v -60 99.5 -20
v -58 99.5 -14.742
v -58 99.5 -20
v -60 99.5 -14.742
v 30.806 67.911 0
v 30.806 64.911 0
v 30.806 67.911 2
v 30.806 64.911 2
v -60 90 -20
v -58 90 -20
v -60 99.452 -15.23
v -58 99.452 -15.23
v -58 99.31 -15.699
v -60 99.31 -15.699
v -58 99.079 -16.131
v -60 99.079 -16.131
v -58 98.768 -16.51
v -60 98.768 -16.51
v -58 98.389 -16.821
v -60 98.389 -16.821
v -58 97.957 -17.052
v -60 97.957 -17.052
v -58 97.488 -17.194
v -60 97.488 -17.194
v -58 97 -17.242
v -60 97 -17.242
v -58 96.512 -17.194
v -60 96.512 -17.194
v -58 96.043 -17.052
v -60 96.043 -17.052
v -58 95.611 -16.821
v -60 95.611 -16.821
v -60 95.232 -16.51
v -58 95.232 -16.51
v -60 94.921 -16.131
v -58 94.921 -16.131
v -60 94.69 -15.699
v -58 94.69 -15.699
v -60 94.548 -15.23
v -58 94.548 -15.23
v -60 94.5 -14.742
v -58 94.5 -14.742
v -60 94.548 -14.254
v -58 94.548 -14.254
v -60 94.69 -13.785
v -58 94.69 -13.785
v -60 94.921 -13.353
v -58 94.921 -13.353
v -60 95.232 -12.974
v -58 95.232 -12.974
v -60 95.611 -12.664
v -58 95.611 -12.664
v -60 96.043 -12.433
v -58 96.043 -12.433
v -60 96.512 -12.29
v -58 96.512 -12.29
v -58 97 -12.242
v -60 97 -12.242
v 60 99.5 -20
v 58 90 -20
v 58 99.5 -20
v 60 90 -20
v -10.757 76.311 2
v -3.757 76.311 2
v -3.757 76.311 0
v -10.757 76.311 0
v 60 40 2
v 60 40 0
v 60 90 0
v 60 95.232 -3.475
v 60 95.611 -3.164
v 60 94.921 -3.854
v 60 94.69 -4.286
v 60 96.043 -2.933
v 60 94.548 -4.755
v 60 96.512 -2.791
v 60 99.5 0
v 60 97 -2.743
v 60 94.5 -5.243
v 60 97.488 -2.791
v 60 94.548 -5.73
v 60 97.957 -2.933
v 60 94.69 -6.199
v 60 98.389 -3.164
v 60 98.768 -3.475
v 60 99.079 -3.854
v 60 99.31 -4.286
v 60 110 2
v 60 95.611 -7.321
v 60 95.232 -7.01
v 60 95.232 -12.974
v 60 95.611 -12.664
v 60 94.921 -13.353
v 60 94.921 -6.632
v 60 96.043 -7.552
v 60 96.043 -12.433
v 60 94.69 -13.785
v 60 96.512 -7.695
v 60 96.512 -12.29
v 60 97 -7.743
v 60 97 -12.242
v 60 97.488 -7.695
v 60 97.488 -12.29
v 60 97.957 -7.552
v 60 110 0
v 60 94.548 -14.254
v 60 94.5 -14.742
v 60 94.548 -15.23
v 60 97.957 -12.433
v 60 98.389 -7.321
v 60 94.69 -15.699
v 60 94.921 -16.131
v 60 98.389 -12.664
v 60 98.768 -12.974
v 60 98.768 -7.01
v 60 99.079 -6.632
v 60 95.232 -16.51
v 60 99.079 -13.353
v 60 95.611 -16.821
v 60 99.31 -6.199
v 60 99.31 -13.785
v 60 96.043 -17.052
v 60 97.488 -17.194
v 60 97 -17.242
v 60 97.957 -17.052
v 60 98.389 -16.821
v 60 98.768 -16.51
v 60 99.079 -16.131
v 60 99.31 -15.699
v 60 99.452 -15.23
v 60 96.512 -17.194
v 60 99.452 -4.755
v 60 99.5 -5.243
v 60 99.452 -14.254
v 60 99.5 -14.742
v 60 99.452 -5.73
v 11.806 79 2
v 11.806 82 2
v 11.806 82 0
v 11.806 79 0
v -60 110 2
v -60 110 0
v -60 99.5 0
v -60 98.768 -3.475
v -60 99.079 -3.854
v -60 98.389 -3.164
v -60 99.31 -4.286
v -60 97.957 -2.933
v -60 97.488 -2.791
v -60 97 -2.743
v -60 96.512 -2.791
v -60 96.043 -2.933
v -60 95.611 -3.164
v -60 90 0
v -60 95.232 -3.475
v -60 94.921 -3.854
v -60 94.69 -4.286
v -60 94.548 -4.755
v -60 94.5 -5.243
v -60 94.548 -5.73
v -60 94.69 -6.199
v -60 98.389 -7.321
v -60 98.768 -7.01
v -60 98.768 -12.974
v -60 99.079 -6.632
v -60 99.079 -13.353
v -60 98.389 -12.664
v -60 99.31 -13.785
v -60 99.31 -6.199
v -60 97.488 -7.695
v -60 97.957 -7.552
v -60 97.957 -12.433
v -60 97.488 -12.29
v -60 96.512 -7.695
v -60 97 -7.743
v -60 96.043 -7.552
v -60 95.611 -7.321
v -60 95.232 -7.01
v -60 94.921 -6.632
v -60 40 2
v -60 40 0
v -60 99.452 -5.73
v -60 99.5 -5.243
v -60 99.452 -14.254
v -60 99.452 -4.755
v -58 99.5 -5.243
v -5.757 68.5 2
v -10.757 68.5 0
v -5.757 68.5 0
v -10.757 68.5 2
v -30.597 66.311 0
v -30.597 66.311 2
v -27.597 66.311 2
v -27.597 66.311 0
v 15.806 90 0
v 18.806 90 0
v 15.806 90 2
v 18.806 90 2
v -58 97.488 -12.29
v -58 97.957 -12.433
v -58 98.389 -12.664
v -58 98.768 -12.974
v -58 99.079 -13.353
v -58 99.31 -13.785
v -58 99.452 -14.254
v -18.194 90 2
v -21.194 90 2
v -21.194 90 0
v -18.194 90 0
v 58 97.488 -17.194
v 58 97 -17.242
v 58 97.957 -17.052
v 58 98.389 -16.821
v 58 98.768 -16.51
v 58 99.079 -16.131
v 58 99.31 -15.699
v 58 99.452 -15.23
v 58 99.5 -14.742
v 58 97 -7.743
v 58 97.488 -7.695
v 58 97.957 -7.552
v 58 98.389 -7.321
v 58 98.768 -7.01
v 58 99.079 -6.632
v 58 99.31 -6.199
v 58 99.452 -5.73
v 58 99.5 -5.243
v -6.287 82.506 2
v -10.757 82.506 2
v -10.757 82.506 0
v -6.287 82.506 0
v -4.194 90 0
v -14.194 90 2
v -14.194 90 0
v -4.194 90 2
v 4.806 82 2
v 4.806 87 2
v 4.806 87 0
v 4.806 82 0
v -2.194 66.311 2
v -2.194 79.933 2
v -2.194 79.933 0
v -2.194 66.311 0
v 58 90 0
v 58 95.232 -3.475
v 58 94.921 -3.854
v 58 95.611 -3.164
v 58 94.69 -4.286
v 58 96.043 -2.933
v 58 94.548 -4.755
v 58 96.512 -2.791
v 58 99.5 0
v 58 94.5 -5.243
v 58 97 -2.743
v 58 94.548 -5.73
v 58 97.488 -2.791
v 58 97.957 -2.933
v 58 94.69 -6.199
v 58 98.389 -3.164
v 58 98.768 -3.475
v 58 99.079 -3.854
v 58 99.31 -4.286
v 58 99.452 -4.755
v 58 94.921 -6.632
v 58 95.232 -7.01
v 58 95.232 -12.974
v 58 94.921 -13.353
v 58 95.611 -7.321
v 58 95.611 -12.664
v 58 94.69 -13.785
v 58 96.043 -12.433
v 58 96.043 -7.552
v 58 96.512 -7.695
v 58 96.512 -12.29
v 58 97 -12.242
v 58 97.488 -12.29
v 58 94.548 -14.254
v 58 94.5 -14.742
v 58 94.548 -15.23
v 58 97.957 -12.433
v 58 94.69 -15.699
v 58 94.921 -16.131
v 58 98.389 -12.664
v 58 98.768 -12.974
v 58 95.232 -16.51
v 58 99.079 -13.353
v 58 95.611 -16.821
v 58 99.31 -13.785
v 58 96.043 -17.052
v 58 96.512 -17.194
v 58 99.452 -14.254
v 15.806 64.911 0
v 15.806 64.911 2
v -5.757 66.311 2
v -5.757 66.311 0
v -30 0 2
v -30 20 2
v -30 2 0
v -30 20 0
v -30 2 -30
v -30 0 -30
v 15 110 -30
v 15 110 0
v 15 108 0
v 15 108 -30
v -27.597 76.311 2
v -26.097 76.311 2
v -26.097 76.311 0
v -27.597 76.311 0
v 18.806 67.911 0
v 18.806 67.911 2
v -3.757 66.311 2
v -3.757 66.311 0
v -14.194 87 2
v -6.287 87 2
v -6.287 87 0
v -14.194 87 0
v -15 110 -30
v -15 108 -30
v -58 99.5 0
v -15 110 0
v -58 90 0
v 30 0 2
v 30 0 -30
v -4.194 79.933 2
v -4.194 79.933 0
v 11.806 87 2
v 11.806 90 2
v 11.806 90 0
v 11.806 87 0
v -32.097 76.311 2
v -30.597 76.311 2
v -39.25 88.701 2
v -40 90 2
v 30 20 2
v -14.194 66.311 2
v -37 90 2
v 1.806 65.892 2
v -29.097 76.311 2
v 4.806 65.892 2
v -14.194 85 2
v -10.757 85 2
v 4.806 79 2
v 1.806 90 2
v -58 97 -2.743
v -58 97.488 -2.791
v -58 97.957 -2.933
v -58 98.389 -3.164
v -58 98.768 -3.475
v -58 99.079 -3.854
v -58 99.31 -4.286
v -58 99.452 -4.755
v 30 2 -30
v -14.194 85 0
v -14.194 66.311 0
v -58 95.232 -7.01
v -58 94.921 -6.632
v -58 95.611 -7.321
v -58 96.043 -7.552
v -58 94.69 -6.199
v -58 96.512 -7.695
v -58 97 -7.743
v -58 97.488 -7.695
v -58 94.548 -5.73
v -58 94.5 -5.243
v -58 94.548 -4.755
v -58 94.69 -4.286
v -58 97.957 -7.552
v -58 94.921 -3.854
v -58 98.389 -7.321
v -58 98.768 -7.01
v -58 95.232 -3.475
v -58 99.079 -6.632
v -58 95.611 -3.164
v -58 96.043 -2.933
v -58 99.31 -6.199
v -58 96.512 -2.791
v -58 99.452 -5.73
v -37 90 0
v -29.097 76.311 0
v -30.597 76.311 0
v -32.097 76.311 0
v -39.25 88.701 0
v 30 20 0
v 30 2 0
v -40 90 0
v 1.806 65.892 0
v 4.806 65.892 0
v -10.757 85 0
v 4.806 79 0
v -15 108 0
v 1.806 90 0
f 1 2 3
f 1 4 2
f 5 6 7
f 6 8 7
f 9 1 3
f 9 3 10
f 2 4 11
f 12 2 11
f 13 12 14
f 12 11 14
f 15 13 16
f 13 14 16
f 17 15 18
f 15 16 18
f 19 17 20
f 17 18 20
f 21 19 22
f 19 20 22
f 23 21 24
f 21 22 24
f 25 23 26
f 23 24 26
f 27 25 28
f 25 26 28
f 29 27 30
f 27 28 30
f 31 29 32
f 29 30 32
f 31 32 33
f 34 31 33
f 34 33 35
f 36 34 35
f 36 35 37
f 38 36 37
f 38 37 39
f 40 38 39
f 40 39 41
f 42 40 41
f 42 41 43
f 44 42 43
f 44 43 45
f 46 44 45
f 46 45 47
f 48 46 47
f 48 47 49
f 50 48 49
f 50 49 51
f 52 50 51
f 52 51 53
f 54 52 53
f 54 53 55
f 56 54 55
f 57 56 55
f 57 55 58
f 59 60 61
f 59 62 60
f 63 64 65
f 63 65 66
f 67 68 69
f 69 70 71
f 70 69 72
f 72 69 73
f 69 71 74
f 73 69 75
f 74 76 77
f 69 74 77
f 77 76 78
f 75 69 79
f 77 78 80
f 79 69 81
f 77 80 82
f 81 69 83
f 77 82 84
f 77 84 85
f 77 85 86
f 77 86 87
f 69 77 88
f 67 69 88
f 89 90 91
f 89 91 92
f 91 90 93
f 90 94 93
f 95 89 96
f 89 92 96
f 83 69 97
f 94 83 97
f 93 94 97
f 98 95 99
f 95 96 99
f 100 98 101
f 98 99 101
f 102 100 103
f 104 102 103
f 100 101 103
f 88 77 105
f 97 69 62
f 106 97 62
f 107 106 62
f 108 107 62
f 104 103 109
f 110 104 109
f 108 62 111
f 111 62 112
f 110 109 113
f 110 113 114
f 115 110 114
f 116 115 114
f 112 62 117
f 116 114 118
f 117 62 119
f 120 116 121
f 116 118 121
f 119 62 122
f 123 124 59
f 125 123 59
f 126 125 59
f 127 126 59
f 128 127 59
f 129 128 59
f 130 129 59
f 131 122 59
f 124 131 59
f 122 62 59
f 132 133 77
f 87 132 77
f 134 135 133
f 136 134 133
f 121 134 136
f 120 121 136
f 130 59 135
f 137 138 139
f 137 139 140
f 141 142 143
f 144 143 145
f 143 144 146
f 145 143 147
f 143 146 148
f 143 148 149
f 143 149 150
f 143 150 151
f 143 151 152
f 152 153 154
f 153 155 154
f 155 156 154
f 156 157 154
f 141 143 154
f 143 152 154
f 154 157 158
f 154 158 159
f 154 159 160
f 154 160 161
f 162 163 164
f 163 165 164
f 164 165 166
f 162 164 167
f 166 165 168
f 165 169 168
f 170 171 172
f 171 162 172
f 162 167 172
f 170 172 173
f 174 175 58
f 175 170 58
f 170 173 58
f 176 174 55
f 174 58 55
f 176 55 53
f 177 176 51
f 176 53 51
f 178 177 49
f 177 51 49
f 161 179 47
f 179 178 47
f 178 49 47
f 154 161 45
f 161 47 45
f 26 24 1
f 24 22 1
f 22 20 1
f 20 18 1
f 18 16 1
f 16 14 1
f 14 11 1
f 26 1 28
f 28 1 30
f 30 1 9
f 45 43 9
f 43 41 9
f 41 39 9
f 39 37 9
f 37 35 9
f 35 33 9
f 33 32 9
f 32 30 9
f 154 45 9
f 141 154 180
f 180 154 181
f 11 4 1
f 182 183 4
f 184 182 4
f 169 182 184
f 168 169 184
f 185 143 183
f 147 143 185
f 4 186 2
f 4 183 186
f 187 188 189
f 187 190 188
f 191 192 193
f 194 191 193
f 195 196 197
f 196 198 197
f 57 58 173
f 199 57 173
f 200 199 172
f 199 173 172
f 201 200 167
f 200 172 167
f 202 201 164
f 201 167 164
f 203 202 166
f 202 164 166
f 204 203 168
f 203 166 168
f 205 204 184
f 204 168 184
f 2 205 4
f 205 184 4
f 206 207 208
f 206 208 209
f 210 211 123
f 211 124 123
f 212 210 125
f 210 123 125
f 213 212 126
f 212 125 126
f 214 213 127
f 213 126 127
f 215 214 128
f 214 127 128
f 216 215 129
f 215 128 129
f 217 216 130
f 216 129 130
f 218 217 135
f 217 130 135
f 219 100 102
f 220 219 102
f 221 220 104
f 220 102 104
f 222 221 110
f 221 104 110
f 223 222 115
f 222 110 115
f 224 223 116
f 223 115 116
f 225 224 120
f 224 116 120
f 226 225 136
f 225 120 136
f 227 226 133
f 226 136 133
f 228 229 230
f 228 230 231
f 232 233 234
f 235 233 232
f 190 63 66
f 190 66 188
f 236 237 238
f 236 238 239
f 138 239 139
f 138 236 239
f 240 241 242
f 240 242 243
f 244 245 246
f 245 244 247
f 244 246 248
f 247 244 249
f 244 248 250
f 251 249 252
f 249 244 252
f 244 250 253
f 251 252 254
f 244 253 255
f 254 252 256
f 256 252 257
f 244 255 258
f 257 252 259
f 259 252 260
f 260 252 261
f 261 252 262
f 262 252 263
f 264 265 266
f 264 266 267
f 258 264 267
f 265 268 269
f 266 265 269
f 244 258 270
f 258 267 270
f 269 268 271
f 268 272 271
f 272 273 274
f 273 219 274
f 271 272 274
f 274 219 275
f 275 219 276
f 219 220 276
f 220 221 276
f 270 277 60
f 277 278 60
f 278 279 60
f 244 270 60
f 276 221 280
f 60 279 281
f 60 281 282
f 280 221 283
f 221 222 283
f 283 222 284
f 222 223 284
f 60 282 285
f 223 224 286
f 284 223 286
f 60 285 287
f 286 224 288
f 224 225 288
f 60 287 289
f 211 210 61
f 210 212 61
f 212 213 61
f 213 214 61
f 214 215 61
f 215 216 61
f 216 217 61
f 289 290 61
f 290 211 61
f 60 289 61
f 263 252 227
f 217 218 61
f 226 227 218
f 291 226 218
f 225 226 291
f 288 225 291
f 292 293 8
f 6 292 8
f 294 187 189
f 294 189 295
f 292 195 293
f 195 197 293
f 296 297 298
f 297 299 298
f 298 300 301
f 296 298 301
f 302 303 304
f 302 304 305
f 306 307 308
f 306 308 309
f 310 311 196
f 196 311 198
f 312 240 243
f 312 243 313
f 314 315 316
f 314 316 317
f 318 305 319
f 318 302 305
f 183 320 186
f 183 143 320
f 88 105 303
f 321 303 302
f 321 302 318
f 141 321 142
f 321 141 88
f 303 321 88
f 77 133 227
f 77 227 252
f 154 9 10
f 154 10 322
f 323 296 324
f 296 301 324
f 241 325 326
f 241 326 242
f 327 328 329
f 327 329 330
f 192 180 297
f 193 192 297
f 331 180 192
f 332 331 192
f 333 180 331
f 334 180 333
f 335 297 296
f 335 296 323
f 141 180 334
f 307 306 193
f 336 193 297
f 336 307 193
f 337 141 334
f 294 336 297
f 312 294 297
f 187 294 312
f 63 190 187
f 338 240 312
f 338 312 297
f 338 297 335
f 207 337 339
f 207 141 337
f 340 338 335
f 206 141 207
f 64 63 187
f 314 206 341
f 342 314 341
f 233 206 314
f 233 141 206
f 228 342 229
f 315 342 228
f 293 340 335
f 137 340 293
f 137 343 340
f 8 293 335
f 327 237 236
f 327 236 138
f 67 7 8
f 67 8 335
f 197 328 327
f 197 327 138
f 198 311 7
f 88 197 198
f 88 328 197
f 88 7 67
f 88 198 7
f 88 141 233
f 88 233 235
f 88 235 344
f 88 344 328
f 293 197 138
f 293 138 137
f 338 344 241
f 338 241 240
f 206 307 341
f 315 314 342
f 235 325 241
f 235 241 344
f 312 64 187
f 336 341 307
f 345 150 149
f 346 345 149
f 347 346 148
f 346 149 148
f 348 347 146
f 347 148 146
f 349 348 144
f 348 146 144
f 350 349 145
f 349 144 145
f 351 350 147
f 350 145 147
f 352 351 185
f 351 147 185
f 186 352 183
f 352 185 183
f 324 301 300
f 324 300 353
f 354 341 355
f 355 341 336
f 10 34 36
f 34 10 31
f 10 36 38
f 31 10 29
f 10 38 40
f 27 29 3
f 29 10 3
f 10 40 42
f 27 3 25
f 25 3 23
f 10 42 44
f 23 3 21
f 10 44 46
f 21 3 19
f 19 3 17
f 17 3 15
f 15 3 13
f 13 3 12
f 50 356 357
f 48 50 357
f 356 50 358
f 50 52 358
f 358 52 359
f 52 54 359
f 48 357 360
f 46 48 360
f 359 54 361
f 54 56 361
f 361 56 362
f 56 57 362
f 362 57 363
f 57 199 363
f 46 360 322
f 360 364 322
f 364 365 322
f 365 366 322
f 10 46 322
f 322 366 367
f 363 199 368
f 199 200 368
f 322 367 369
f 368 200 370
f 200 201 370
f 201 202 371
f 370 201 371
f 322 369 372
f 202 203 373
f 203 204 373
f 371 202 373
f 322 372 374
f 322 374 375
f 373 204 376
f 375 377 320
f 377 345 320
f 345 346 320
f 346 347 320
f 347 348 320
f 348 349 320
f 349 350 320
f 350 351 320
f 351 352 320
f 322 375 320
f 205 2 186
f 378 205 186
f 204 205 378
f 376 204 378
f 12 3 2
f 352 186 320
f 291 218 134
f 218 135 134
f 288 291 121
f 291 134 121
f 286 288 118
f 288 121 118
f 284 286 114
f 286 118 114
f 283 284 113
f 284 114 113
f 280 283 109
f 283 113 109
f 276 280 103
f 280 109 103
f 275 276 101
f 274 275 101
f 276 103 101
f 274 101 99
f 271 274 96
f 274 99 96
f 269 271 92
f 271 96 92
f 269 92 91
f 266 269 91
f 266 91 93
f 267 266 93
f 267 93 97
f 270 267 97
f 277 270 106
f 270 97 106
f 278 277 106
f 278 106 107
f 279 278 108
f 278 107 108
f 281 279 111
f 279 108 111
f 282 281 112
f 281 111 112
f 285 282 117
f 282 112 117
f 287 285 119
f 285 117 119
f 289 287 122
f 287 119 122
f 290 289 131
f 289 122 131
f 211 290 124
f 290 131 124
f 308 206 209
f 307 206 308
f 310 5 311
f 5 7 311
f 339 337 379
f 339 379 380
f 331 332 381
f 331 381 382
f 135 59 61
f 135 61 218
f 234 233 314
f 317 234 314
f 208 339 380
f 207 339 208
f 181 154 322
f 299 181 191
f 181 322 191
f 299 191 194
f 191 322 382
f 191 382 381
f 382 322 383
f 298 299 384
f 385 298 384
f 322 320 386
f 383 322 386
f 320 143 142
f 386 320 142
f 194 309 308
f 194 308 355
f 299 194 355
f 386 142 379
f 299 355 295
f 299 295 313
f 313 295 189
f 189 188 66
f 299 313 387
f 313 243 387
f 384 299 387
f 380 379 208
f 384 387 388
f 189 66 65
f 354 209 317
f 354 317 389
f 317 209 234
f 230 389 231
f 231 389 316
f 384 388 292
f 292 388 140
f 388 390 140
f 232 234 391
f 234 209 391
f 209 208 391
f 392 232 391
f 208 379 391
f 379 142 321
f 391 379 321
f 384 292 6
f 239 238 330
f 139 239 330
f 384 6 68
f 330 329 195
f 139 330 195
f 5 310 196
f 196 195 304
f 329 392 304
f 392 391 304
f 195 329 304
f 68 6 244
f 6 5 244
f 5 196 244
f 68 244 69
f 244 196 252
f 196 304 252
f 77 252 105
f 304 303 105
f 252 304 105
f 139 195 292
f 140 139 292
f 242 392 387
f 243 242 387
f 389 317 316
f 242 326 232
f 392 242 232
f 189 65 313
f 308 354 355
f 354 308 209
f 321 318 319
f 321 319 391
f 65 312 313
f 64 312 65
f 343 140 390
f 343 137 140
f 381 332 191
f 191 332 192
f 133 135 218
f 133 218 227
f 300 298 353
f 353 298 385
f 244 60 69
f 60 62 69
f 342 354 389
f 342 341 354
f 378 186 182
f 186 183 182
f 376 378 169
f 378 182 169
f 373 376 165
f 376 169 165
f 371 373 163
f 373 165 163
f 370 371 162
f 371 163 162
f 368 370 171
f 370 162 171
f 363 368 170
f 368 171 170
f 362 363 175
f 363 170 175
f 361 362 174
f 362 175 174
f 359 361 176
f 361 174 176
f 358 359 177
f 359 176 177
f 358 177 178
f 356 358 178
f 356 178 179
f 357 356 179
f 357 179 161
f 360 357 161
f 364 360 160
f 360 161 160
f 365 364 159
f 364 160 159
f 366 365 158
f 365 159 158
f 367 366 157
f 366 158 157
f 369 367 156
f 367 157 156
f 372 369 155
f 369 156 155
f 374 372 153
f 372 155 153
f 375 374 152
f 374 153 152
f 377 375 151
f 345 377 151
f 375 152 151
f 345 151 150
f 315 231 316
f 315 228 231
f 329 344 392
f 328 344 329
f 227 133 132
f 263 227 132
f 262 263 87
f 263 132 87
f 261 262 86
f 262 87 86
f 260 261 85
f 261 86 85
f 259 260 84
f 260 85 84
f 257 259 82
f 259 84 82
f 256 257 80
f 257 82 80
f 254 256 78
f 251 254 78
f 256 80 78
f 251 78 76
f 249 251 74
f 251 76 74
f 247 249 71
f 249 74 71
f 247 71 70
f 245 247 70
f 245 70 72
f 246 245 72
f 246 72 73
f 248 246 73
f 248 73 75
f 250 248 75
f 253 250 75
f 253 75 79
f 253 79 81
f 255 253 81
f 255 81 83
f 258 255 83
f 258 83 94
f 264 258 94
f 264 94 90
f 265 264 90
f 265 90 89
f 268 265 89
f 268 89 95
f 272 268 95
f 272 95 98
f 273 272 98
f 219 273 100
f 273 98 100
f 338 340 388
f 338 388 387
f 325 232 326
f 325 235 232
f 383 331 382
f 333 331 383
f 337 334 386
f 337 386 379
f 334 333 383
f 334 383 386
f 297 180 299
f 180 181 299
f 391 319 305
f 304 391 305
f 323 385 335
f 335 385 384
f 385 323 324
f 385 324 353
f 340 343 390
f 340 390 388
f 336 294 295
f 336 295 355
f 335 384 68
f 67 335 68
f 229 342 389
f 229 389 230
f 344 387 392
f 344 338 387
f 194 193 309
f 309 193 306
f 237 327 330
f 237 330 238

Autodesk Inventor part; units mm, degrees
ref_plane "YZ Plane" through (0, 0, 0) normal (1, 0, 0) x (0, 1, 0)
ref_plane "XZ Plane" through (0, 0, 0) normal (0, 1, 0) x (-1, 0, 0)
ref_plane "XY Plane" through (0, 0, 0) normal (0, 0, 1) x (1, 0, 0)
sketch "Sketch1" plane through (0, 0, 0) normal (0, 0, 1) x (1, 0, 0)
  line L0 (-30, 0) -> (30, 0)
  line L1 (30, 0) -> (30, 20)
  line L2 (-30, 20) -> (-30, 0)
  line L3 (60, 40) -> (60, 110)
  line L4 (60, 110) -> (-60, 110)
  line L5 (-60, 110) -> (-60, 40)
  line L6 (-60, 40) -> (-30, 20)
  line L7 (30, 20) -> (60, 40)
  point P0 (0, 0)
  dimension "d0" = 60
  dimension "d1" = 20
  dimension "d2" = 120
  dimension "d3" = 70
extrude "Extrusion1" add sketch "Sketch1" along normal blind 2
sketch "Sketch2" plane through (-30, 0, 0) normal (0, -1, 0) x (1, 0, 0)
  line L0 (60, 0) -> (60, 2) projected
  line L1 (60, 0) -> (0, 0)
  line L2 (0, 0) -> (0, -30)
  line L3 (0, -30) -> (60, -30)
  line L4 (60, -30) -> (60, 0)
  point P0 (30, 0)
  dimension "d6" = 60
  dimension "d7" = 30
extrude "Extrusion2" add sketch "Sketch2" against normal blind 2
sketch "Sketch3" plane through (0, 0, 2) normal (0, 0, 1) x (1, 0, 0)
  line L0 (-37, 90) -> (-29.0967, 76.3111)
  line L1 (-37, 90) -> (-21.1935, 90) construction
  line L2 (-30.5967, 76.3111) -> (-32.0967, 76.3111)
  line L3 (-32.0967, 76.3111) -> (-39.25, 88.701)
  line L4 (-39.25, 88.701) -> (-40, 90)
  line L5 (-40, 90) -> (-37, 90)
  line L6 (-29.0967, 76.3111) -> (-21.1935, 90)
  line L7 (-21.1935, 90) -> (-18.1935, 90)
  line L8 (-18.1935, 90) -> (-26.0967, 76.3111)
  line L9 (-26.0967, 76.3111) -> (-27.5967, 76.3111)
  line L10 (-30.5967, 76.3111) -> (-30.5967, 66.3111)
  line L11 (-30.5967, 66.3111) -> (-27.5967, 66.3111)
  line L12 (-27.5967, 66.3111) -> (-27.5967, 76.3111)
  line L13 (-14.1935, 90) -> (-14.1935, 66.3111)
  line L14 (-14.1935, 90) -> (-4.1935, 90)
  line L15 (-4.1935, 90) -> (-4.1935, 79.933)
  line L16 (-4.1935, 79.933) -> (-2.1935, 79.933)
  line L17 (-2.1935, 79.933) -> (-2.1935, 66.3111)
  line L18 (-2.1935, 66.3111) -> (-14.1935, 66.3111)
  line L19 (-10.757, 87) -> (-10.757, 82.506)
  line L20 (-10.757, 82.506) -> (-6.2868, 82.506)
  line L21 (-6.2868, 82.506) -> (-6.2868, 87)
  line L22 (-6.2868, 87) -> (-10.757, 87)
  line L23 (-10.757, 76.3111) -> (-10.757, 68.4995)
  line L24 (-10.757, 68.4995) -> (-3.7569, 68.4995)
  line L25 (-3.7569, 68.4995) -> (-3.7569, 76.3111)
  line L26 (-3.7569, 76.3111) -> (-10.757, 76.3111)
  line L27 (1.8065, 65.8916) -> (1.8065, 90)
  line L28 (1.8065, 90) -> (11.8065, 90)
  line L29 (11.8065, 90) -> (11.8065, 87)
  line L30 (11.8065, 87) -> (4.8065, 87)
  line L31 (4.8065, 87) -> (4.8065, 82)
  line L32 (4.8065, 82) -> (11.8065, 82)
  line L33 (11.8065, 82) -> (11.8065, 79)
  line L34 (11.8065, 79) -> (4.8065, 79)
  line L35 (4.8065, 79) -> (4.8065, 65.8916)
  line L36 (4.8065, 65.8916) -> (1.8065, 65.8916)
  line L37 (15.8065, 90) -> (15.8065, 64.9111)
  line L38 (15.8065, 64.9111) -> (30.8065, 64.9111)
  line L39 (30.8065, 64.9111) -> (30.8065, 67.9111)
  line L40 (30.8065, 67.9111) -> (18.8065, 67.9111)
  line L41 (18.8065, 67.9111) -> (18.8065, 90)
  line L42 (18.8065, 90) -> (15.8065, 90)
  point P0 (0, 0)
  dimension "d10" = 60
  dimension "d12" = 3
  dimension "d13" = 60
  dimension "d14" = 10
  dimension "d15" = 10
  dimension "d16" = 2
  dimension "d17" = 10
  dimension "d19" = 3
  dimension "d20" = 7
  dimension "d21" = 5
  dimension "d22" = 3
  dimension "d23" = 15
  dimension "d25" = 3
  dimension "d26" = 12
  dimension "d27" = 4
  dimension "d28" = 4
  dimension "d29" = 4
extrude "Extrusion3" cut sketch "Sketch3" against normal blind 2
sketch "Sketch6" plane through (0, 0, 2) normal (0, 0, 1) x (1, 0, 0)
  line L0 (-14.1935, 66.3111) -> (-2.1935, 66.3111) projected
  line L1 (-3.7569, 68.4995) -> (-5.7569, 68.4995)
  line L2 (-5.7569, 68.4995) -> (-5.7569, 66.3111)
  line L3 (-5.7569, 66.3111) -> (-3.7569, 66.3111)
  line L4 (-3.7569, 66.3111) -> (-3.7569, 68.4995)
  line L5 (-14.1935, 90) -> (-14.1935, 66.3111) projected
  line L6 (-10.757, 87) -> (-14.1935, 87)
  line L7 (-14.1935, 87) -> (-14.1935, 85)
  line L8 (-14.1935, 85) -> (-10.757, 85)
  line L9 (-10.757, 85) -> (-10.757, 87)
  point P0 (0, 0)
  dimension "d32" = 2
  dimension "d33" = 2
extrude "Extrusion4" add sketch "Sketch6" against normal blind 2
sketch "Sketch8" plane through (-60, 110, 0) normal (0, 1, 0) x (1, 0, 0)
  line L0 (45, 0) -> (75, 0)
  line L1 (75, 0) -> (75, 30)
  line L2 (75, 30) -> (45, 30)
  line L3 (45, 30) -> (45, 0)
  point P0 (60, 0)
  dimension "d36" = 30
  dimension "d37" = 30
extrude "Extrusion5" add sketch "Sketch8" against normal blind 2
sketch "Sketch9" plane through (-60, 40, 0) normal (-1, 0, 0) x (0, 0, 1)
  line L0 (0, 0) -> (0, 70) projected
  line L1 (0, 59.5) -> (-20, 59.5)
  line L2 (-20, 59.5) -> (-20, 50)
  line L3 (-20, 50) -> (0, 50)
  line L4 (0, 50) -> (0, 59.5)
  line L5 (0, 0) -> (2, 0) projected
  point P0 (0, -40)
  dimension "d40" = 20
  dimension "d41" = 9.5
  dimension "d56" = 50
extrude "Extrusion6" add sketch "Sketch9" against normal blind 2
sketch "Sketch10" plane through (-60, 40, 2) normal (-1, 0, 0) x (0, 0, 1)
  circle A0 centre (-16.7422, 57) radius 2.5
  line L0 (-2, 59.5) -> (-22, 59.5) projected
  line L1 (-22, 59.5) -> (-22, 50) projected
  circle A1 centre (-7.2426, 57) radius 2.5
  point P0 (-2, -40)
  dimension "d44" = 5
  dimension "d45" = 2.5
  dimension "d46" = 5.2578
  dimension "d47" = 5
  dimension "d48" = 2.5
  dimension "d49" = 9.4996
extrude "Extrusion7" cut sketch "Sketch10" against normal blind 2
sketch "Sketch12" plane through (60, 40, 0) normal (1, 0, 0) x (0, 0, -1)
  line L0 (5.2426, 59.5) -> (0, 59.5) projected
  line L1 (20, 50) -> (20, 59.5) projected
  line L2 (0, 59.5) -> (20, 59.5)
  line L3 (20, 59.5) -> (20, 50)
  line L4 (20, 50) -> (0, 50)
  line L5 (0, 50) -> (0, 59.5)
  point P0 (0, -40)
extrude "Extrusion8" add sketch "Sketch12" against normal blind 2
sketch "Sketch13" plane through (60, 40, 2) normal (1, 0, 0) x (0, 0, -1)
  circle A0 centre (7.2426, 57) radius 2.5 projected
  circle A1 centre (7.2426, 57) radius 2.5
  circle A2 centre (16.7422, 57) radius 2.5 projected
  circle A3 centre (16.7422, 57) radius 2.5
  point P0 (2, -40)
  point P1 (7.2426, 59.5)
  point P2 (16.7422, 59.5)
extrude "Extrusion9" cut sketch "Sketch13" against normal blind 2
properties part number "Body Front"
